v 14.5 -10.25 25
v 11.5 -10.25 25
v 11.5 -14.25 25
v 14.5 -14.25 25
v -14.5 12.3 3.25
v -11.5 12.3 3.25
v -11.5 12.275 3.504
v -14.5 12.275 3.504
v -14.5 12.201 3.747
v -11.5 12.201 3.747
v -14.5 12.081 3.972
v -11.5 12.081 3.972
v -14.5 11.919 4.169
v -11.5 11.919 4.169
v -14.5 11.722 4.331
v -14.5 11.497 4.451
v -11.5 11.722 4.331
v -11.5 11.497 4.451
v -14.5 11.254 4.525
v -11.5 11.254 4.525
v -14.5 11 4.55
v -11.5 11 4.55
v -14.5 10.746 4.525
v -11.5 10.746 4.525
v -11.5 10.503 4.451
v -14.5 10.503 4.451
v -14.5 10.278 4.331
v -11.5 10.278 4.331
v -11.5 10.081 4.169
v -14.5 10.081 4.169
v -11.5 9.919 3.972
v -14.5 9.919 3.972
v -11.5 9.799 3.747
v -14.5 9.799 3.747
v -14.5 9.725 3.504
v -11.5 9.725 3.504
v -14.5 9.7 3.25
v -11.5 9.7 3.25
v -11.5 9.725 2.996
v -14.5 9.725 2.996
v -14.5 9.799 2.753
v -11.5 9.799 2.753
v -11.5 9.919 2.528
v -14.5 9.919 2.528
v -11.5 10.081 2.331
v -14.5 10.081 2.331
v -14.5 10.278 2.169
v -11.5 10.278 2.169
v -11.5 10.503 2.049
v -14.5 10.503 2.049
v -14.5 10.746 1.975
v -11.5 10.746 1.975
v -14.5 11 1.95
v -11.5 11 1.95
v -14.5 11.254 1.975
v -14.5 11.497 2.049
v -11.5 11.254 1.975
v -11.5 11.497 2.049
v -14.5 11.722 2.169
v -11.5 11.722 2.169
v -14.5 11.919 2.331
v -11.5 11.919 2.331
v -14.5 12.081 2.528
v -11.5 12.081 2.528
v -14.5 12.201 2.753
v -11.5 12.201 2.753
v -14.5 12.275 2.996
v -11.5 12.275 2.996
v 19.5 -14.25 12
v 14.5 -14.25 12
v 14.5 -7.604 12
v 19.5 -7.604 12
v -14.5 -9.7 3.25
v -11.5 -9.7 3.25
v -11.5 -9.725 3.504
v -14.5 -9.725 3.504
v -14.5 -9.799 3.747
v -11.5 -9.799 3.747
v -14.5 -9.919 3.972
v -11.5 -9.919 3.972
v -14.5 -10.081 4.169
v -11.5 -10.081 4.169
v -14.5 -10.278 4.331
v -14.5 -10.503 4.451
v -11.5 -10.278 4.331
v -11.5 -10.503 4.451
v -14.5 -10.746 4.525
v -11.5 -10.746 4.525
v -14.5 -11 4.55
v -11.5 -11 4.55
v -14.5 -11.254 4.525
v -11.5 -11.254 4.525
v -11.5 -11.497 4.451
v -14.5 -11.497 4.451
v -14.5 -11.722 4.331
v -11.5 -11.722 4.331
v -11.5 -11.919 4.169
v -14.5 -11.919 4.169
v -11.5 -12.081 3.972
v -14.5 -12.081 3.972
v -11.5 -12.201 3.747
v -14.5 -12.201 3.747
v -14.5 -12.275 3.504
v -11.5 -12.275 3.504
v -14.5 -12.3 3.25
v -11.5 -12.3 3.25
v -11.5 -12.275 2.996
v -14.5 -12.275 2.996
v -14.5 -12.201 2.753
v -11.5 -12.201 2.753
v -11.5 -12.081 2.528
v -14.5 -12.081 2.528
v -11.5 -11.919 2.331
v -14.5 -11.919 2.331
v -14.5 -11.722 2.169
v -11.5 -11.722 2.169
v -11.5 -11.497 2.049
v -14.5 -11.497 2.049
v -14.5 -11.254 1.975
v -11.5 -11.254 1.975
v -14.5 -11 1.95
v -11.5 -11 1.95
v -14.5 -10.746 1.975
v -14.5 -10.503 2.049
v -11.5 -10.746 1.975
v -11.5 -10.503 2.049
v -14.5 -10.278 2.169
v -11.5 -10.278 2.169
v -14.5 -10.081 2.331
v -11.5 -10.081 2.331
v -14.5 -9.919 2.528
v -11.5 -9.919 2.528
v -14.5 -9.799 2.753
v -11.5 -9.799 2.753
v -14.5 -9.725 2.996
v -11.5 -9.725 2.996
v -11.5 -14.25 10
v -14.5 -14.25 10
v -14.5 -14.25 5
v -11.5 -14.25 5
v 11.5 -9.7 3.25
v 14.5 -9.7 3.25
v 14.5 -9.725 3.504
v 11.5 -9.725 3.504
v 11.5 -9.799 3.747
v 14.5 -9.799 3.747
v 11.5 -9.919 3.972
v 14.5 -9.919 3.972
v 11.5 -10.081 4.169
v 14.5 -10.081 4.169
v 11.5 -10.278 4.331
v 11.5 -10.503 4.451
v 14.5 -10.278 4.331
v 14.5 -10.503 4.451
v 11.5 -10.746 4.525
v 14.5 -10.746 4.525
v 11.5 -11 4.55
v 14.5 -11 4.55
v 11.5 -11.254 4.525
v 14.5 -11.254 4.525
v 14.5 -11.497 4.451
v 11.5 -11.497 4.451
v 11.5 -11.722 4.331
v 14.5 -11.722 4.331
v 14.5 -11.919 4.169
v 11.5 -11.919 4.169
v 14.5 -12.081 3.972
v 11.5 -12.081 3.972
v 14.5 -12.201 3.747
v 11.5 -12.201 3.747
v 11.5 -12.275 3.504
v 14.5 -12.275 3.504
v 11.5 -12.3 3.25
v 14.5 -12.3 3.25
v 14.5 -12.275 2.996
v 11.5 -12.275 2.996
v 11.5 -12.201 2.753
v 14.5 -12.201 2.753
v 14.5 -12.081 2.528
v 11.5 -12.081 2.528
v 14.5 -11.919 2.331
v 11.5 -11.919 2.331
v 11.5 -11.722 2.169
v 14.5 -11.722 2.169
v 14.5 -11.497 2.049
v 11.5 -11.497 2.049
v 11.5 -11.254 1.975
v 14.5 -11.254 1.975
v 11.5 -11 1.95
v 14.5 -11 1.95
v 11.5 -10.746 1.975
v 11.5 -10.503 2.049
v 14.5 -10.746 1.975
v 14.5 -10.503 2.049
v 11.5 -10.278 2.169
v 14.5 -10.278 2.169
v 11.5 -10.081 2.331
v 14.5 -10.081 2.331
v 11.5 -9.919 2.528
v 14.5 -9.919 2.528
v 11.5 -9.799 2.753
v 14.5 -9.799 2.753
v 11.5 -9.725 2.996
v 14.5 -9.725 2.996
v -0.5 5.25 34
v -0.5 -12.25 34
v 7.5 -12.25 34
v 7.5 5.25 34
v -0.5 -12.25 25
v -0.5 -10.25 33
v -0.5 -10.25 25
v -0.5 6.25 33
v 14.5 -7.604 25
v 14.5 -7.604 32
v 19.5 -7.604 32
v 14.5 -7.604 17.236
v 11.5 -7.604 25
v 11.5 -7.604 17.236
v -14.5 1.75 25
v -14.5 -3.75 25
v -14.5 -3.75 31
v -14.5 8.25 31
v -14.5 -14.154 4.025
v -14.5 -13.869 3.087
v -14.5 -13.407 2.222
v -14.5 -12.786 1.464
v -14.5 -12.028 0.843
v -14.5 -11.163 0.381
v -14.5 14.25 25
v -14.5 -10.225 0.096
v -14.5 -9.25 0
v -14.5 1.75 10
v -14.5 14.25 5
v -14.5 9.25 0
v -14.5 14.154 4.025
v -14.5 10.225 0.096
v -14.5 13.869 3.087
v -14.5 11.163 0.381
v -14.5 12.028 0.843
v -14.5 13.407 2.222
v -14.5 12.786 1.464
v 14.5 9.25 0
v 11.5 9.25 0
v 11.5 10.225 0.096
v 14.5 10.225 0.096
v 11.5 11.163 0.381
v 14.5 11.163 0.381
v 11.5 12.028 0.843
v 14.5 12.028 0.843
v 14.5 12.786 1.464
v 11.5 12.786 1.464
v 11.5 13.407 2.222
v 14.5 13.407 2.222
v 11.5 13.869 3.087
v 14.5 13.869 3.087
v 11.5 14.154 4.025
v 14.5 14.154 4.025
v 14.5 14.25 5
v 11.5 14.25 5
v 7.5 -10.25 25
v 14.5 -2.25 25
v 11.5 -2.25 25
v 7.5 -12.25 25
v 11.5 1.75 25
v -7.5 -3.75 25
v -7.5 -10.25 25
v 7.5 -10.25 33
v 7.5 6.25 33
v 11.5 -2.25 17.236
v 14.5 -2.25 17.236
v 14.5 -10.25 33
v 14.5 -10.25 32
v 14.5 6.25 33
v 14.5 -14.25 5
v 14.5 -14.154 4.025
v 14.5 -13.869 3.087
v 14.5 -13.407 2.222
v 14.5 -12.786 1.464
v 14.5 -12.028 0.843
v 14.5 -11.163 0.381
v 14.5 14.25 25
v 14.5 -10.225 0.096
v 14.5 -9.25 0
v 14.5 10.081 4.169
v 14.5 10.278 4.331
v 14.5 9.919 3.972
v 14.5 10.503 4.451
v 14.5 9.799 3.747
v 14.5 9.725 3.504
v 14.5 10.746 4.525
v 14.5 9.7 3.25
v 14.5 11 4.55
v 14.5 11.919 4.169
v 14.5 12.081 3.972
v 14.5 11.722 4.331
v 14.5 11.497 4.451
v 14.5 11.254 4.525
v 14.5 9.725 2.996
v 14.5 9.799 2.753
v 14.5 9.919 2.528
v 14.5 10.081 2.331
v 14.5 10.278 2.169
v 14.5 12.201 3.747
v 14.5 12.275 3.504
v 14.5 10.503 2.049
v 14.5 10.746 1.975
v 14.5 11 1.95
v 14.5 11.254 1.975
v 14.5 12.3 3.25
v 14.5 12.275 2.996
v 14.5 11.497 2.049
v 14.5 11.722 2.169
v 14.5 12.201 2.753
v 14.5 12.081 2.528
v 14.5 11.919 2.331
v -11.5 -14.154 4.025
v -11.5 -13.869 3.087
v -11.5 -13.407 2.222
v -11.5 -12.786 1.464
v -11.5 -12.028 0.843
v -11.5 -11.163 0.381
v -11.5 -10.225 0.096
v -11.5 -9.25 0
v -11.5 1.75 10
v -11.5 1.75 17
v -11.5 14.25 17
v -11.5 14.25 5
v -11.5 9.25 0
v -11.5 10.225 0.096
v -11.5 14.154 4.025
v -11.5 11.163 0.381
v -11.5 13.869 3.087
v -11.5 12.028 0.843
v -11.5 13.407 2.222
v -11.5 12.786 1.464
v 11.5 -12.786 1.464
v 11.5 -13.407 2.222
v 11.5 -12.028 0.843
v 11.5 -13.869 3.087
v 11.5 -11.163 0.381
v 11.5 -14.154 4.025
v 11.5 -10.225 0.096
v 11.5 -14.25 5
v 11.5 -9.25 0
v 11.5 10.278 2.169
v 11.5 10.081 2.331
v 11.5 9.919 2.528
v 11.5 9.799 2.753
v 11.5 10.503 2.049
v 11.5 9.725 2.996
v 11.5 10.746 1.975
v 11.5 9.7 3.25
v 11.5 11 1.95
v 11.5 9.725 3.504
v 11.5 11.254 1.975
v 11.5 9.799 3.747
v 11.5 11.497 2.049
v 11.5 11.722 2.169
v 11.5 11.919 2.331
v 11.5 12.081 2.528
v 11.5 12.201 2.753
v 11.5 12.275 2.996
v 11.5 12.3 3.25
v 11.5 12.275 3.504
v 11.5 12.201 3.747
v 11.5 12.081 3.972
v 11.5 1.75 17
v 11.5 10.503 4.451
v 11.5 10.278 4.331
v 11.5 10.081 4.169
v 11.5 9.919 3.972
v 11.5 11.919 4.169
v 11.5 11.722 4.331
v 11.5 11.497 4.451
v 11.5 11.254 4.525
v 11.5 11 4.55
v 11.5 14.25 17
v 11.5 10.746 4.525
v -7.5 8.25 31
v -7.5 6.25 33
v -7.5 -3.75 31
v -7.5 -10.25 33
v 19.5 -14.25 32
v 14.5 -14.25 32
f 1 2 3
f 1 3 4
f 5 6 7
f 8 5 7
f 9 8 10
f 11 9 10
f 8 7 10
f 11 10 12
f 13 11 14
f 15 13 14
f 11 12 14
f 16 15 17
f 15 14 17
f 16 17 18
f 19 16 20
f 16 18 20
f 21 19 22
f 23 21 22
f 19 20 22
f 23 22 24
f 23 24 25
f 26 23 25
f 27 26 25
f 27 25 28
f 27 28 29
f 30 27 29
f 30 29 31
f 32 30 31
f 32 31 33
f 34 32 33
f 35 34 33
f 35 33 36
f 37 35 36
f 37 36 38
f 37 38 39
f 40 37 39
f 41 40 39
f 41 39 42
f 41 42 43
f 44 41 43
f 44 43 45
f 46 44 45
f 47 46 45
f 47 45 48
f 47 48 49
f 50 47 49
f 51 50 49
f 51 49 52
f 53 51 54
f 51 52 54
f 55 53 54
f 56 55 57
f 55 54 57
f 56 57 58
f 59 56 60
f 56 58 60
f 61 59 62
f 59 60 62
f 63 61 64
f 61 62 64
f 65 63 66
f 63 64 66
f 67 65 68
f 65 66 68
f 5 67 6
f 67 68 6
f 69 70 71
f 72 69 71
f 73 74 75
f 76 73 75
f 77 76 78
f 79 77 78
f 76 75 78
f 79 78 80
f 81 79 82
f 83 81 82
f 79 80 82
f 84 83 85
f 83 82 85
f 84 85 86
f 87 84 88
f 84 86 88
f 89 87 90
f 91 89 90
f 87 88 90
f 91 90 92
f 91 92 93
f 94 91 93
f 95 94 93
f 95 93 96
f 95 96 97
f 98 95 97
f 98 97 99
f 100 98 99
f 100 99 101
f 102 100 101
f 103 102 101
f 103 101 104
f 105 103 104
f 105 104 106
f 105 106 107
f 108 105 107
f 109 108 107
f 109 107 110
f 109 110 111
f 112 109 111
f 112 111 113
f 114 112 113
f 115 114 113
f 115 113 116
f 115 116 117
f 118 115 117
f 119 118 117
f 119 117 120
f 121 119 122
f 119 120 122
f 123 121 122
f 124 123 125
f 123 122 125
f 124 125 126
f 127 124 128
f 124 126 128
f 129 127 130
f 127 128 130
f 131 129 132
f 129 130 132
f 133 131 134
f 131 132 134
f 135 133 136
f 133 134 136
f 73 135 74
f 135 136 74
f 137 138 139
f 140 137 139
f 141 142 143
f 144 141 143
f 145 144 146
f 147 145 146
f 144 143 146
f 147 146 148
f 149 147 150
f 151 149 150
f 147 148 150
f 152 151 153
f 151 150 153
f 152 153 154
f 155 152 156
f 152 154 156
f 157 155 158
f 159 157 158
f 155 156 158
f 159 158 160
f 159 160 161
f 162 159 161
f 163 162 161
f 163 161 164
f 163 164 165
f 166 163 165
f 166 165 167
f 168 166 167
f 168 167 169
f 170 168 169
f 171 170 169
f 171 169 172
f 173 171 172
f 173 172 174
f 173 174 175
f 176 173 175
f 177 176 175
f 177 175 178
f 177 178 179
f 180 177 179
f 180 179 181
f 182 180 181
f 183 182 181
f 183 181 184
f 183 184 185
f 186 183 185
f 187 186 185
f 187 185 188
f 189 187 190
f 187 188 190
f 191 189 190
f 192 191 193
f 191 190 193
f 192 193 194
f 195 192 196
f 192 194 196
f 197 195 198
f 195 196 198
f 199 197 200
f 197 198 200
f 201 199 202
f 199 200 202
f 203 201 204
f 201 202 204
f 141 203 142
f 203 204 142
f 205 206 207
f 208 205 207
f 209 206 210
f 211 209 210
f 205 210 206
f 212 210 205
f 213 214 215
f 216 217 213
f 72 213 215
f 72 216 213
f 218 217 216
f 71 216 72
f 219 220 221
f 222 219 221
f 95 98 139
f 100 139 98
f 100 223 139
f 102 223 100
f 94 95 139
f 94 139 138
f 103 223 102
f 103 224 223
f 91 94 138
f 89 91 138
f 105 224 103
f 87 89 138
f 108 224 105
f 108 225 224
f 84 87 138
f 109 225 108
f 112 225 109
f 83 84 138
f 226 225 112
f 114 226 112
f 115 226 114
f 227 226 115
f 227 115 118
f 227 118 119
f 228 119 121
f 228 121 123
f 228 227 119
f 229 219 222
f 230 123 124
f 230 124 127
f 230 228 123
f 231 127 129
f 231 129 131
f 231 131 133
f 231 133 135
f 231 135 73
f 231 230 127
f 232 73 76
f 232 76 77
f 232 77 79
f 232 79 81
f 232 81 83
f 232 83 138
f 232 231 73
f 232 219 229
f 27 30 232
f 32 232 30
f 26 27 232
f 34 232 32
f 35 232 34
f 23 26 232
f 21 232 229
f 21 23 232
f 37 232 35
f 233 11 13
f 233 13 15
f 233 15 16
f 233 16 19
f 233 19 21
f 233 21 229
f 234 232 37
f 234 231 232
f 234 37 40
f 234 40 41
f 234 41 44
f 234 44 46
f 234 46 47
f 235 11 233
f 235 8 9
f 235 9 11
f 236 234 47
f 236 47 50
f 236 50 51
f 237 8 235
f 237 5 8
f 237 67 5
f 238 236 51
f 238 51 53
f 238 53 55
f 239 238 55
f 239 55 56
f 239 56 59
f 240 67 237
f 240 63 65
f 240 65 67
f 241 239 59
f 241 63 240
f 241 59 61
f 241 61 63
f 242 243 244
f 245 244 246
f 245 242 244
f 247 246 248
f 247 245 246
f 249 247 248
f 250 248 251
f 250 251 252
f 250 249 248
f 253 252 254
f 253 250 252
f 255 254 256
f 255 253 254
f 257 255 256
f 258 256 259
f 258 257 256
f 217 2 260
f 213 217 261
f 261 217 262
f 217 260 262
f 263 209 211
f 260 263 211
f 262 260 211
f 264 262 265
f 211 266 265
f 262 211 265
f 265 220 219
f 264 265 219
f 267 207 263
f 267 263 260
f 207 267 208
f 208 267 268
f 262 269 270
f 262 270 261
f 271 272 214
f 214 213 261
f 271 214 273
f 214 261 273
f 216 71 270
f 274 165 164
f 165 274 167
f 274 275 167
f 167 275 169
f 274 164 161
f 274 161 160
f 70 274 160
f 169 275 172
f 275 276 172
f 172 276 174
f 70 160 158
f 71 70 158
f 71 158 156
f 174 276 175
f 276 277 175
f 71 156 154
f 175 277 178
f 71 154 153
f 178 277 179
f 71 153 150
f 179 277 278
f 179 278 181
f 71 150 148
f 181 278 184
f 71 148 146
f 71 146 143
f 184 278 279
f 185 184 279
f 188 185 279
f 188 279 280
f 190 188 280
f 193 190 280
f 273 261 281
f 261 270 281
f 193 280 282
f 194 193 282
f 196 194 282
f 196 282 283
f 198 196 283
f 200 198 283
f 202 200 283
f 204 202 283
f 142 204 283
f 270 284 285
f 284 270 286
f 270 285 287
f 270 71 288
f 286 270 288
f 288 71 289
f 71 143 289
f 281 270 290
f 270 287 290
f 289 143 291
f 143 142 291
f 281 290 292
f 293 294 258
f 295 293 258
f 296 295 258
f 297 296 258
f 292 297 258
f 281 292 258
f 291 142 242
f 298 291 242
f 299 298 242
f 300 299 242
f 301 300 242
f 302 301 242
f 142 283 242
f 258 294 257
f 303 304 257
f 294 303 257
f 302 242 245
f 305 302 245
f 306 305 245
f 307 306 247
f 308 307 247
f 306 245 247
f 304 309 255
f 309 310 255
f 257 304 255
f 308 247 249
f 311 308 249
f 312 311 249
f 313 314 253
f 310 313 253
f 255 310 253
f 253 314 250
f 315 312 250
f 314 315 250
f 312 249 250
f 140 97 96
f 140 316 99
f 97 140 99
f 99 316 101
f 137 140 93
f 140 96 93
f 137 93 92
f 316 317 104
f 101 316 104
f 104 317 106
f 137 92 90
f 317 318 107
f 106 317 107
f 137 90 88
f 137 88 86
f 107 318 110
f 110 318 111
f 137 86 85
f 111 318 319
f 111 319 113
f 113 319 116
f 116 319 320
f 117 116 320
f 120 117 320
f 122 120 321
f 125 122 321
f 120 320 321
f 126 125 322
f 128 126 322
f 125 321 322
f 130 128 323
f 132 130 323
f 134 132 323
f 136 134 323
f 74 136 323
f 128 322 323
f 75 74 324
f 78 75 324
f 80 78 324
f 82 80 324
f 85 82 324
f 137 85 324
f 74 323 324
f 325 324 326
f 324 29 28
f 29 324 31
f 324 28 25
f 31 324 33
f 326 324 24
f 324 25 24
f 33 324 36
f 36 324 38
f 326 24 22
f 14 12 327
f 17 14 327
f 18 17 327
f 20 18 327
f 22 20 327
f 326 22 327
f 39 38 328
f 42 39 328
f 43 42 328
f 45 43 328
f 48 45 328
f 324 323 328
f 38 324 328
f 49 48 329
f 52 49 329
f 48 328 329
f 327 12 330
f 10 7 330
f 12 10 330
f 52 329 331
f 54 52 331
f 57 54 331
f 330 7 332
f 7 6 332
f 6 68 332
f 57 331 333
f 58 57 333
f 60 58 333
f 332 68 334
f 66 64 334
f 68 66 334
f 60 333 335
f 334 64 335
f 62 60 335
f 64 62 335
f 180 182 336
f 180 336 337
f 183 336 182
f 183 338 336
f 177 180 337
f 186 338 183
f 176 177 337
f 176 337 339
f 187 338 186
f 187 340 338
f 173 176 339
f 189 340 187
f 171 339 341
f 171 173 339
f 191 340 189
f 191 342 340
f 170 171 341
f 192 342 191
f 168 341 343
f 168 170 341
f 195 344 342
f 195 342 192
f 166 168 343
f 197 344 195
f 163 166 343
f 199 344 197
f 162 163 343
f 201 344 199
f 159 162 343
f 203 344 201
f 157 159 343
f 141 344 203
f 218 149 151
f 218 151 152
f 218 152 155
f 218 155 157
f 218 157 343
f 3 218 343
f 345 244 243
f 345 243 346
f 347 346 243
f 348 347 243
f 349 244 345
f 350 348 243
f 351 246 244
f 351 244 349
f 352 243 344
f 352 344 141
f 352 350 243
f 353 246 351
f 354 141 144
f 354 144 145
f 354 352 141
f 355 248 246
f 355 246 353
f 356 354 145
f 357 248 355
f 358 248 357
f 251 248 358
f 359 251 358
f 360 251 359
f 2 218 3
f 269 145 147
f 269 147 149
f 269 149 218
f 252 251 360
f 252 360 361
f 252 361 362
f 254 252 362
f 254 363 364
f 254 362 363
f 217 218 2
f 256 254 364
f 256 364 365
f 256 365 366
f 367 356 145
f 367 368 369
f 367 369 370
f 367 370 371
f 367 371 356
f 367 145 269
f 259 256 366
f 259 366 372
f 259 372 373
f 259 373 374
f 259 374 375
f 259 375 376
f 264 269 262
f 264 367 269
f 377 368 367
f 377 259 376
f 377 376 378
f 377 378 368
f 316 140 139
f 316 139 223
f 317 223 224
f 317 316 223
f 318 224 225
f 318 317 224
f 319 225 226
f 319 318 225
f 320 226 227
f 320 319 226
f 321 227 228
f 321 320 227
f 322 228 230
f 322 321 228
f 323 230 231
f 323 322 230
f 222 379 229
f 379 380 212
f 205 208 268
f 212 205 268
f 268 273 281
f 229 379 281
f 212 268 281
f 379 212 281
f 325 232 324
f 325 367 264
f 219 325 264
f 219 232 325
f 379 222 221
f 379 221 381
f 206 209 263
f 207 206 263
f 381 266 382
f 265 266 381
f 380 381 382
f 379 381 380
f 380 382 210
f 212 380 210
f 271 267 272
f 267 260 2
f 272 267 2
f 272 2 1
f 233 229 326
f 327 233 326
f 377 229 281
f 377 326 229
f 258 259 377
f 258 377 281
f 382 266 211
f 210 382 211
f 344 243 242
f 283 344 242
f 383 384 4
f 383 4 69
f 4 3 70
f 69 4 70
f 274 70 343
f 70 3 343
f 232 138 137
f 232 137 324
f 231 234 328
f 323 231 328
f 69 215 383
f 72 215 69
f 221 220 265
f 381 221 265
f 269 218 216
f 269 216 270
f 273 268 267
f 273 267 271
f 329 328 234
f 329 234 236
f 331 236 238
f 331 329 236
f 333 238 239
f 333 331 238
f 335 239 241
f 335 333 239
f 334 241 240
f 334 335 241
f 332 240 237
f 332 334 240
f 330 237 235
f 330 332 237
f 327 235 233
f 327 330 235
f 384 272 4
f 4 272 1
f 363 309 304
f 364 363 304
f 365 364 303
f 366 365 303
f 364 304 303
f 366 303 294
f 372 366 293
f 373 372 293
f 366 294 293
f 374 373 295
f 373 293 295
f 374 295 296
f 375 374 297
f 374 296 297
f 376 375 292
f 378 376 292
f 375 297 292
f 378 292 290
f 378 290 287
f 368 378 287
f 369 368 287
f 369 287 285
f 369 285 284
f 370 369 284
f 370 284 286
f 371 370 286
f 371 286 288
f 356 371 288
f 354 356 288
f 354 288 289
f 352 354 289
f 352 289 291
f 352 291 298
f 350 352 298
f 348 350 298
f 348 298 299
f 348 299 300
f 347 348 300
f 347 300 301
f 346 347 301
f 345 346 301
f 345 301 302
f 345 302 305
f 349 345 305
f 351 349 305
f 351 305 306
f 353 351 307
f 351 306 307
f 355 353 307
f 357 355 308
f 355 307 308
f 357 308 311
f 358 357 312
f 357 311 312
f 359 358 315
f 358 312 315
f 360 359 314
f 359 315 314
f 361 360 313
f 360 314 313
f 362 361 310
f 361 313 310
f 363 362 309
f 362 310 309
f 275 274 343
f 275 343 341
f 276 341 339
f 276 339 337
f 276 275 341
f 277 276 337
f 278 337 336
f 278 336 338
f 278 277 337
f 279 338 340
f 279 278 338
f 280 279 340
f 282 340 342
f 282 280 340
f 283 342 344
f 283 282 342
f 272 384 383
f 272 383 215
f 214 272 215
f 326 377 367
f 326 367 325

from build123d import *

# Parameters (mm, degrees)
SKETCH1_W           = 29
SKETCH1_H           = 28.5
BOSS_EXTRUDE1_DEPTH = 25
SKETCH2_R           = 1.3
CUT_EXTRUDE1_DEPTH  = 41.854161355
FILLET1_R           = 5
SKETCH3_W           = 23
SKETCH3_H           = 28.5
CUT_EXTRUDE2_DEPTH  = 17
SKETCH5_W           = 7
SKETCH5_H           = 18
BOSS_EXTRUDE2_DEPTH = 6
SKETCH6_W           = 7
SKETCH6_H           = 24.5
BOSS_EXTRUDE3_DEPTH = 8
SKETCH8_W           = 8
SKETCH8_H           = 26.5
BOSS_EXTRUDE4_DEPTH = 9
SKETCH9_W           = 7
SKETCH9_H           = 24.5
BOSS_EXTRUDE5_DEPTH = 8
CUT_EXTRUDE5_DEPTH  = 31
SKETCH11_W          = 20
SKETCH11_H          = 6.645872657
BOSS_EXTRUDE6_DEPTH = 5
SKETCH14_W          = 15
SKETCH14_H          = 12
CUT_EXTRUDE8_DEPTH  = 26
SKETCH15_W          = 7.764432238
SKETCH15_H          = 5.354127343
CUT_EXTRUDE9_DEPTH  = 25
SKETCH16_W          = 15
SKETCH16_H          = 4
CUT_EXTRUDE11_DEPTH = 26


with BuildPart() as part:
    # Sketch1 → Boss-Extrude1 (new body)
    with BuildSketch(Plane.XY):
        Rectangle(SKETCH1_W, SKETCH1_H)
    extrude(amount=BOSS_EXTRUDE1_DEPTH)

    # Sketch2 → Cut-Extrude1 (cut, through all)
    with BuildSketch(Plane(origin=(14.5, 0, 0), x_dir=(0, 0, -1), z_dir=(1, 0, 0))):
        with Locations(Location((-3.25, 11, 0), (0, 0, 90))):
            Circle(SKETCH2_R)
        with Locations(Location((-3.25, -11, 0), (0, 0, 90))):
            Circle(SKETCH2_R)
    extrude(amount=-CUT_EXTRUDE1_DEPTH, mode=Mode.SUBTRACT)

    # Fillet1
    fillet1_edges = [part.edges().sort_by_distance(p)[0] for p in [
        (0, -14.25, 0),
        (0, 14.25, 0),
    ]]
    fillet(fillet1_edges, radius=FILLET1_R)

    # Sketch3 → Cut-Extrude2 (cut)
    with BuildSketch(Plane(origin=(0, 0, 0), x_dir=(-1, 0, 0), z_dir=(0, 0, -1))):
        Rectangle(SKETCH3_W, SKETCH3_H)
    extrude(amount=-CUT_EXTRUDE2_DEPTH, mode=Mode.SUBTRACT)

    # Sketch5 → Boss-Extrude2 (add)
    with BuildSketch(Plane.XY.offset(25)):
        with Locations((-11, 5.25)):
            Rectangle(SKETCH5_W, SKETCH5_H)
    extrude(amount=BOSS_EXTRUDE2_DEPTH)

    # Sketch6 → Boss-Extrude3 (add)
    with BuildSketch(Plane.XY.offset(25)):
        with Locations((-4, 2)):
            Rectangle(SKETCH6_W, SKETCH6_H)
    extrude(amount=BOSS_EXTRUDE3_DEPTH)

    # Sketch8 → Boss-Extrude4 (add)
    with BuildSketch(Plane.XY.offset(25)):
        with Locations((3.5, 1)):
            Rectangle(SKETCH8_W, SKETCH8_H)
    extrude(amount=BOSS_EXTRUDE4_DEPTH)

    # Sketch9 → Boss-Extrude5 (add)
    with BuildSketch(Plane.XY.offset(25)):
        with Locations((11, 2)):
            Rectangle(SKETCH9_W, SKETCH9_H)
    extrude(amount=BOSS_EXTRUDE5_DEPTH)

    # Sketch10 → Cut-Extrude5 (cut)
    with BuildSketch(Plane(origin=(14.5, 0, 0), x_dir=(0, 0, -1), z_dir=(1, 0, 0))):
        Polygon((-33, 6.25), (-25, 14.25), (-33, 14.25), align=None)
        Polygon((-34, 5.25), (-33, 6.25), (-33, 14.25), (-34, 14.25), align=None)
    extrude(amount=-CUT_EXTRUDE5_DEPTH, mode=Mode.SUBTRACT)

    # Sketch11 → Boss-Extrude6 (add)
    with BuildSketch(Plane(origin=(14.5, 0, 0), x_dir=(0, 0, -1), z_dir=(1, 0, 0))):
        with Locations((-22, -10.927063672)):
            Rectangle(SKETCH11_W, SKETCH11_H)
    extrude(amount=BOSS_EXTRUDE6_DEPTH)

    # Sketch14 → Cut-Extrude8 (cut)
    with BuildSketch(Plane.ZY.offset(14.5)):
        with Locations((17.5, -8.25)):
            Rectangle(SKETCH14_W, SKETCH14_H)
    extrude(amount=-CUT_EXTRUDE8_DEPTH, mode=Mode.SUBTRACT)

    # Sketch15 → Cut-Extrude9 (cut)
    with BuildSketch(Plane.ZY.offset(-11.5)):
        with Locations((21.117783881, -4.927063672)):
            Rectangle(SKETCH15_W, SKETCH15_H)
    extrude(amount=-CUT_EXTRUDE9_DEPTH, mode=Mode.SUBTRACT)

    # Sketch16 → Cut-Extrude11 (cut)
    with BuildSketch(Plane.ZY.offset(14.5)):
        with Locations((17.5, -0.25)):
            Rectangle(SKETCH16_W, SKETCH16_H)
    extrude(amount=-CUT_EXTRUDE11_DEPTH, mode=Mode.SUBTRACT)


solid = part.part
